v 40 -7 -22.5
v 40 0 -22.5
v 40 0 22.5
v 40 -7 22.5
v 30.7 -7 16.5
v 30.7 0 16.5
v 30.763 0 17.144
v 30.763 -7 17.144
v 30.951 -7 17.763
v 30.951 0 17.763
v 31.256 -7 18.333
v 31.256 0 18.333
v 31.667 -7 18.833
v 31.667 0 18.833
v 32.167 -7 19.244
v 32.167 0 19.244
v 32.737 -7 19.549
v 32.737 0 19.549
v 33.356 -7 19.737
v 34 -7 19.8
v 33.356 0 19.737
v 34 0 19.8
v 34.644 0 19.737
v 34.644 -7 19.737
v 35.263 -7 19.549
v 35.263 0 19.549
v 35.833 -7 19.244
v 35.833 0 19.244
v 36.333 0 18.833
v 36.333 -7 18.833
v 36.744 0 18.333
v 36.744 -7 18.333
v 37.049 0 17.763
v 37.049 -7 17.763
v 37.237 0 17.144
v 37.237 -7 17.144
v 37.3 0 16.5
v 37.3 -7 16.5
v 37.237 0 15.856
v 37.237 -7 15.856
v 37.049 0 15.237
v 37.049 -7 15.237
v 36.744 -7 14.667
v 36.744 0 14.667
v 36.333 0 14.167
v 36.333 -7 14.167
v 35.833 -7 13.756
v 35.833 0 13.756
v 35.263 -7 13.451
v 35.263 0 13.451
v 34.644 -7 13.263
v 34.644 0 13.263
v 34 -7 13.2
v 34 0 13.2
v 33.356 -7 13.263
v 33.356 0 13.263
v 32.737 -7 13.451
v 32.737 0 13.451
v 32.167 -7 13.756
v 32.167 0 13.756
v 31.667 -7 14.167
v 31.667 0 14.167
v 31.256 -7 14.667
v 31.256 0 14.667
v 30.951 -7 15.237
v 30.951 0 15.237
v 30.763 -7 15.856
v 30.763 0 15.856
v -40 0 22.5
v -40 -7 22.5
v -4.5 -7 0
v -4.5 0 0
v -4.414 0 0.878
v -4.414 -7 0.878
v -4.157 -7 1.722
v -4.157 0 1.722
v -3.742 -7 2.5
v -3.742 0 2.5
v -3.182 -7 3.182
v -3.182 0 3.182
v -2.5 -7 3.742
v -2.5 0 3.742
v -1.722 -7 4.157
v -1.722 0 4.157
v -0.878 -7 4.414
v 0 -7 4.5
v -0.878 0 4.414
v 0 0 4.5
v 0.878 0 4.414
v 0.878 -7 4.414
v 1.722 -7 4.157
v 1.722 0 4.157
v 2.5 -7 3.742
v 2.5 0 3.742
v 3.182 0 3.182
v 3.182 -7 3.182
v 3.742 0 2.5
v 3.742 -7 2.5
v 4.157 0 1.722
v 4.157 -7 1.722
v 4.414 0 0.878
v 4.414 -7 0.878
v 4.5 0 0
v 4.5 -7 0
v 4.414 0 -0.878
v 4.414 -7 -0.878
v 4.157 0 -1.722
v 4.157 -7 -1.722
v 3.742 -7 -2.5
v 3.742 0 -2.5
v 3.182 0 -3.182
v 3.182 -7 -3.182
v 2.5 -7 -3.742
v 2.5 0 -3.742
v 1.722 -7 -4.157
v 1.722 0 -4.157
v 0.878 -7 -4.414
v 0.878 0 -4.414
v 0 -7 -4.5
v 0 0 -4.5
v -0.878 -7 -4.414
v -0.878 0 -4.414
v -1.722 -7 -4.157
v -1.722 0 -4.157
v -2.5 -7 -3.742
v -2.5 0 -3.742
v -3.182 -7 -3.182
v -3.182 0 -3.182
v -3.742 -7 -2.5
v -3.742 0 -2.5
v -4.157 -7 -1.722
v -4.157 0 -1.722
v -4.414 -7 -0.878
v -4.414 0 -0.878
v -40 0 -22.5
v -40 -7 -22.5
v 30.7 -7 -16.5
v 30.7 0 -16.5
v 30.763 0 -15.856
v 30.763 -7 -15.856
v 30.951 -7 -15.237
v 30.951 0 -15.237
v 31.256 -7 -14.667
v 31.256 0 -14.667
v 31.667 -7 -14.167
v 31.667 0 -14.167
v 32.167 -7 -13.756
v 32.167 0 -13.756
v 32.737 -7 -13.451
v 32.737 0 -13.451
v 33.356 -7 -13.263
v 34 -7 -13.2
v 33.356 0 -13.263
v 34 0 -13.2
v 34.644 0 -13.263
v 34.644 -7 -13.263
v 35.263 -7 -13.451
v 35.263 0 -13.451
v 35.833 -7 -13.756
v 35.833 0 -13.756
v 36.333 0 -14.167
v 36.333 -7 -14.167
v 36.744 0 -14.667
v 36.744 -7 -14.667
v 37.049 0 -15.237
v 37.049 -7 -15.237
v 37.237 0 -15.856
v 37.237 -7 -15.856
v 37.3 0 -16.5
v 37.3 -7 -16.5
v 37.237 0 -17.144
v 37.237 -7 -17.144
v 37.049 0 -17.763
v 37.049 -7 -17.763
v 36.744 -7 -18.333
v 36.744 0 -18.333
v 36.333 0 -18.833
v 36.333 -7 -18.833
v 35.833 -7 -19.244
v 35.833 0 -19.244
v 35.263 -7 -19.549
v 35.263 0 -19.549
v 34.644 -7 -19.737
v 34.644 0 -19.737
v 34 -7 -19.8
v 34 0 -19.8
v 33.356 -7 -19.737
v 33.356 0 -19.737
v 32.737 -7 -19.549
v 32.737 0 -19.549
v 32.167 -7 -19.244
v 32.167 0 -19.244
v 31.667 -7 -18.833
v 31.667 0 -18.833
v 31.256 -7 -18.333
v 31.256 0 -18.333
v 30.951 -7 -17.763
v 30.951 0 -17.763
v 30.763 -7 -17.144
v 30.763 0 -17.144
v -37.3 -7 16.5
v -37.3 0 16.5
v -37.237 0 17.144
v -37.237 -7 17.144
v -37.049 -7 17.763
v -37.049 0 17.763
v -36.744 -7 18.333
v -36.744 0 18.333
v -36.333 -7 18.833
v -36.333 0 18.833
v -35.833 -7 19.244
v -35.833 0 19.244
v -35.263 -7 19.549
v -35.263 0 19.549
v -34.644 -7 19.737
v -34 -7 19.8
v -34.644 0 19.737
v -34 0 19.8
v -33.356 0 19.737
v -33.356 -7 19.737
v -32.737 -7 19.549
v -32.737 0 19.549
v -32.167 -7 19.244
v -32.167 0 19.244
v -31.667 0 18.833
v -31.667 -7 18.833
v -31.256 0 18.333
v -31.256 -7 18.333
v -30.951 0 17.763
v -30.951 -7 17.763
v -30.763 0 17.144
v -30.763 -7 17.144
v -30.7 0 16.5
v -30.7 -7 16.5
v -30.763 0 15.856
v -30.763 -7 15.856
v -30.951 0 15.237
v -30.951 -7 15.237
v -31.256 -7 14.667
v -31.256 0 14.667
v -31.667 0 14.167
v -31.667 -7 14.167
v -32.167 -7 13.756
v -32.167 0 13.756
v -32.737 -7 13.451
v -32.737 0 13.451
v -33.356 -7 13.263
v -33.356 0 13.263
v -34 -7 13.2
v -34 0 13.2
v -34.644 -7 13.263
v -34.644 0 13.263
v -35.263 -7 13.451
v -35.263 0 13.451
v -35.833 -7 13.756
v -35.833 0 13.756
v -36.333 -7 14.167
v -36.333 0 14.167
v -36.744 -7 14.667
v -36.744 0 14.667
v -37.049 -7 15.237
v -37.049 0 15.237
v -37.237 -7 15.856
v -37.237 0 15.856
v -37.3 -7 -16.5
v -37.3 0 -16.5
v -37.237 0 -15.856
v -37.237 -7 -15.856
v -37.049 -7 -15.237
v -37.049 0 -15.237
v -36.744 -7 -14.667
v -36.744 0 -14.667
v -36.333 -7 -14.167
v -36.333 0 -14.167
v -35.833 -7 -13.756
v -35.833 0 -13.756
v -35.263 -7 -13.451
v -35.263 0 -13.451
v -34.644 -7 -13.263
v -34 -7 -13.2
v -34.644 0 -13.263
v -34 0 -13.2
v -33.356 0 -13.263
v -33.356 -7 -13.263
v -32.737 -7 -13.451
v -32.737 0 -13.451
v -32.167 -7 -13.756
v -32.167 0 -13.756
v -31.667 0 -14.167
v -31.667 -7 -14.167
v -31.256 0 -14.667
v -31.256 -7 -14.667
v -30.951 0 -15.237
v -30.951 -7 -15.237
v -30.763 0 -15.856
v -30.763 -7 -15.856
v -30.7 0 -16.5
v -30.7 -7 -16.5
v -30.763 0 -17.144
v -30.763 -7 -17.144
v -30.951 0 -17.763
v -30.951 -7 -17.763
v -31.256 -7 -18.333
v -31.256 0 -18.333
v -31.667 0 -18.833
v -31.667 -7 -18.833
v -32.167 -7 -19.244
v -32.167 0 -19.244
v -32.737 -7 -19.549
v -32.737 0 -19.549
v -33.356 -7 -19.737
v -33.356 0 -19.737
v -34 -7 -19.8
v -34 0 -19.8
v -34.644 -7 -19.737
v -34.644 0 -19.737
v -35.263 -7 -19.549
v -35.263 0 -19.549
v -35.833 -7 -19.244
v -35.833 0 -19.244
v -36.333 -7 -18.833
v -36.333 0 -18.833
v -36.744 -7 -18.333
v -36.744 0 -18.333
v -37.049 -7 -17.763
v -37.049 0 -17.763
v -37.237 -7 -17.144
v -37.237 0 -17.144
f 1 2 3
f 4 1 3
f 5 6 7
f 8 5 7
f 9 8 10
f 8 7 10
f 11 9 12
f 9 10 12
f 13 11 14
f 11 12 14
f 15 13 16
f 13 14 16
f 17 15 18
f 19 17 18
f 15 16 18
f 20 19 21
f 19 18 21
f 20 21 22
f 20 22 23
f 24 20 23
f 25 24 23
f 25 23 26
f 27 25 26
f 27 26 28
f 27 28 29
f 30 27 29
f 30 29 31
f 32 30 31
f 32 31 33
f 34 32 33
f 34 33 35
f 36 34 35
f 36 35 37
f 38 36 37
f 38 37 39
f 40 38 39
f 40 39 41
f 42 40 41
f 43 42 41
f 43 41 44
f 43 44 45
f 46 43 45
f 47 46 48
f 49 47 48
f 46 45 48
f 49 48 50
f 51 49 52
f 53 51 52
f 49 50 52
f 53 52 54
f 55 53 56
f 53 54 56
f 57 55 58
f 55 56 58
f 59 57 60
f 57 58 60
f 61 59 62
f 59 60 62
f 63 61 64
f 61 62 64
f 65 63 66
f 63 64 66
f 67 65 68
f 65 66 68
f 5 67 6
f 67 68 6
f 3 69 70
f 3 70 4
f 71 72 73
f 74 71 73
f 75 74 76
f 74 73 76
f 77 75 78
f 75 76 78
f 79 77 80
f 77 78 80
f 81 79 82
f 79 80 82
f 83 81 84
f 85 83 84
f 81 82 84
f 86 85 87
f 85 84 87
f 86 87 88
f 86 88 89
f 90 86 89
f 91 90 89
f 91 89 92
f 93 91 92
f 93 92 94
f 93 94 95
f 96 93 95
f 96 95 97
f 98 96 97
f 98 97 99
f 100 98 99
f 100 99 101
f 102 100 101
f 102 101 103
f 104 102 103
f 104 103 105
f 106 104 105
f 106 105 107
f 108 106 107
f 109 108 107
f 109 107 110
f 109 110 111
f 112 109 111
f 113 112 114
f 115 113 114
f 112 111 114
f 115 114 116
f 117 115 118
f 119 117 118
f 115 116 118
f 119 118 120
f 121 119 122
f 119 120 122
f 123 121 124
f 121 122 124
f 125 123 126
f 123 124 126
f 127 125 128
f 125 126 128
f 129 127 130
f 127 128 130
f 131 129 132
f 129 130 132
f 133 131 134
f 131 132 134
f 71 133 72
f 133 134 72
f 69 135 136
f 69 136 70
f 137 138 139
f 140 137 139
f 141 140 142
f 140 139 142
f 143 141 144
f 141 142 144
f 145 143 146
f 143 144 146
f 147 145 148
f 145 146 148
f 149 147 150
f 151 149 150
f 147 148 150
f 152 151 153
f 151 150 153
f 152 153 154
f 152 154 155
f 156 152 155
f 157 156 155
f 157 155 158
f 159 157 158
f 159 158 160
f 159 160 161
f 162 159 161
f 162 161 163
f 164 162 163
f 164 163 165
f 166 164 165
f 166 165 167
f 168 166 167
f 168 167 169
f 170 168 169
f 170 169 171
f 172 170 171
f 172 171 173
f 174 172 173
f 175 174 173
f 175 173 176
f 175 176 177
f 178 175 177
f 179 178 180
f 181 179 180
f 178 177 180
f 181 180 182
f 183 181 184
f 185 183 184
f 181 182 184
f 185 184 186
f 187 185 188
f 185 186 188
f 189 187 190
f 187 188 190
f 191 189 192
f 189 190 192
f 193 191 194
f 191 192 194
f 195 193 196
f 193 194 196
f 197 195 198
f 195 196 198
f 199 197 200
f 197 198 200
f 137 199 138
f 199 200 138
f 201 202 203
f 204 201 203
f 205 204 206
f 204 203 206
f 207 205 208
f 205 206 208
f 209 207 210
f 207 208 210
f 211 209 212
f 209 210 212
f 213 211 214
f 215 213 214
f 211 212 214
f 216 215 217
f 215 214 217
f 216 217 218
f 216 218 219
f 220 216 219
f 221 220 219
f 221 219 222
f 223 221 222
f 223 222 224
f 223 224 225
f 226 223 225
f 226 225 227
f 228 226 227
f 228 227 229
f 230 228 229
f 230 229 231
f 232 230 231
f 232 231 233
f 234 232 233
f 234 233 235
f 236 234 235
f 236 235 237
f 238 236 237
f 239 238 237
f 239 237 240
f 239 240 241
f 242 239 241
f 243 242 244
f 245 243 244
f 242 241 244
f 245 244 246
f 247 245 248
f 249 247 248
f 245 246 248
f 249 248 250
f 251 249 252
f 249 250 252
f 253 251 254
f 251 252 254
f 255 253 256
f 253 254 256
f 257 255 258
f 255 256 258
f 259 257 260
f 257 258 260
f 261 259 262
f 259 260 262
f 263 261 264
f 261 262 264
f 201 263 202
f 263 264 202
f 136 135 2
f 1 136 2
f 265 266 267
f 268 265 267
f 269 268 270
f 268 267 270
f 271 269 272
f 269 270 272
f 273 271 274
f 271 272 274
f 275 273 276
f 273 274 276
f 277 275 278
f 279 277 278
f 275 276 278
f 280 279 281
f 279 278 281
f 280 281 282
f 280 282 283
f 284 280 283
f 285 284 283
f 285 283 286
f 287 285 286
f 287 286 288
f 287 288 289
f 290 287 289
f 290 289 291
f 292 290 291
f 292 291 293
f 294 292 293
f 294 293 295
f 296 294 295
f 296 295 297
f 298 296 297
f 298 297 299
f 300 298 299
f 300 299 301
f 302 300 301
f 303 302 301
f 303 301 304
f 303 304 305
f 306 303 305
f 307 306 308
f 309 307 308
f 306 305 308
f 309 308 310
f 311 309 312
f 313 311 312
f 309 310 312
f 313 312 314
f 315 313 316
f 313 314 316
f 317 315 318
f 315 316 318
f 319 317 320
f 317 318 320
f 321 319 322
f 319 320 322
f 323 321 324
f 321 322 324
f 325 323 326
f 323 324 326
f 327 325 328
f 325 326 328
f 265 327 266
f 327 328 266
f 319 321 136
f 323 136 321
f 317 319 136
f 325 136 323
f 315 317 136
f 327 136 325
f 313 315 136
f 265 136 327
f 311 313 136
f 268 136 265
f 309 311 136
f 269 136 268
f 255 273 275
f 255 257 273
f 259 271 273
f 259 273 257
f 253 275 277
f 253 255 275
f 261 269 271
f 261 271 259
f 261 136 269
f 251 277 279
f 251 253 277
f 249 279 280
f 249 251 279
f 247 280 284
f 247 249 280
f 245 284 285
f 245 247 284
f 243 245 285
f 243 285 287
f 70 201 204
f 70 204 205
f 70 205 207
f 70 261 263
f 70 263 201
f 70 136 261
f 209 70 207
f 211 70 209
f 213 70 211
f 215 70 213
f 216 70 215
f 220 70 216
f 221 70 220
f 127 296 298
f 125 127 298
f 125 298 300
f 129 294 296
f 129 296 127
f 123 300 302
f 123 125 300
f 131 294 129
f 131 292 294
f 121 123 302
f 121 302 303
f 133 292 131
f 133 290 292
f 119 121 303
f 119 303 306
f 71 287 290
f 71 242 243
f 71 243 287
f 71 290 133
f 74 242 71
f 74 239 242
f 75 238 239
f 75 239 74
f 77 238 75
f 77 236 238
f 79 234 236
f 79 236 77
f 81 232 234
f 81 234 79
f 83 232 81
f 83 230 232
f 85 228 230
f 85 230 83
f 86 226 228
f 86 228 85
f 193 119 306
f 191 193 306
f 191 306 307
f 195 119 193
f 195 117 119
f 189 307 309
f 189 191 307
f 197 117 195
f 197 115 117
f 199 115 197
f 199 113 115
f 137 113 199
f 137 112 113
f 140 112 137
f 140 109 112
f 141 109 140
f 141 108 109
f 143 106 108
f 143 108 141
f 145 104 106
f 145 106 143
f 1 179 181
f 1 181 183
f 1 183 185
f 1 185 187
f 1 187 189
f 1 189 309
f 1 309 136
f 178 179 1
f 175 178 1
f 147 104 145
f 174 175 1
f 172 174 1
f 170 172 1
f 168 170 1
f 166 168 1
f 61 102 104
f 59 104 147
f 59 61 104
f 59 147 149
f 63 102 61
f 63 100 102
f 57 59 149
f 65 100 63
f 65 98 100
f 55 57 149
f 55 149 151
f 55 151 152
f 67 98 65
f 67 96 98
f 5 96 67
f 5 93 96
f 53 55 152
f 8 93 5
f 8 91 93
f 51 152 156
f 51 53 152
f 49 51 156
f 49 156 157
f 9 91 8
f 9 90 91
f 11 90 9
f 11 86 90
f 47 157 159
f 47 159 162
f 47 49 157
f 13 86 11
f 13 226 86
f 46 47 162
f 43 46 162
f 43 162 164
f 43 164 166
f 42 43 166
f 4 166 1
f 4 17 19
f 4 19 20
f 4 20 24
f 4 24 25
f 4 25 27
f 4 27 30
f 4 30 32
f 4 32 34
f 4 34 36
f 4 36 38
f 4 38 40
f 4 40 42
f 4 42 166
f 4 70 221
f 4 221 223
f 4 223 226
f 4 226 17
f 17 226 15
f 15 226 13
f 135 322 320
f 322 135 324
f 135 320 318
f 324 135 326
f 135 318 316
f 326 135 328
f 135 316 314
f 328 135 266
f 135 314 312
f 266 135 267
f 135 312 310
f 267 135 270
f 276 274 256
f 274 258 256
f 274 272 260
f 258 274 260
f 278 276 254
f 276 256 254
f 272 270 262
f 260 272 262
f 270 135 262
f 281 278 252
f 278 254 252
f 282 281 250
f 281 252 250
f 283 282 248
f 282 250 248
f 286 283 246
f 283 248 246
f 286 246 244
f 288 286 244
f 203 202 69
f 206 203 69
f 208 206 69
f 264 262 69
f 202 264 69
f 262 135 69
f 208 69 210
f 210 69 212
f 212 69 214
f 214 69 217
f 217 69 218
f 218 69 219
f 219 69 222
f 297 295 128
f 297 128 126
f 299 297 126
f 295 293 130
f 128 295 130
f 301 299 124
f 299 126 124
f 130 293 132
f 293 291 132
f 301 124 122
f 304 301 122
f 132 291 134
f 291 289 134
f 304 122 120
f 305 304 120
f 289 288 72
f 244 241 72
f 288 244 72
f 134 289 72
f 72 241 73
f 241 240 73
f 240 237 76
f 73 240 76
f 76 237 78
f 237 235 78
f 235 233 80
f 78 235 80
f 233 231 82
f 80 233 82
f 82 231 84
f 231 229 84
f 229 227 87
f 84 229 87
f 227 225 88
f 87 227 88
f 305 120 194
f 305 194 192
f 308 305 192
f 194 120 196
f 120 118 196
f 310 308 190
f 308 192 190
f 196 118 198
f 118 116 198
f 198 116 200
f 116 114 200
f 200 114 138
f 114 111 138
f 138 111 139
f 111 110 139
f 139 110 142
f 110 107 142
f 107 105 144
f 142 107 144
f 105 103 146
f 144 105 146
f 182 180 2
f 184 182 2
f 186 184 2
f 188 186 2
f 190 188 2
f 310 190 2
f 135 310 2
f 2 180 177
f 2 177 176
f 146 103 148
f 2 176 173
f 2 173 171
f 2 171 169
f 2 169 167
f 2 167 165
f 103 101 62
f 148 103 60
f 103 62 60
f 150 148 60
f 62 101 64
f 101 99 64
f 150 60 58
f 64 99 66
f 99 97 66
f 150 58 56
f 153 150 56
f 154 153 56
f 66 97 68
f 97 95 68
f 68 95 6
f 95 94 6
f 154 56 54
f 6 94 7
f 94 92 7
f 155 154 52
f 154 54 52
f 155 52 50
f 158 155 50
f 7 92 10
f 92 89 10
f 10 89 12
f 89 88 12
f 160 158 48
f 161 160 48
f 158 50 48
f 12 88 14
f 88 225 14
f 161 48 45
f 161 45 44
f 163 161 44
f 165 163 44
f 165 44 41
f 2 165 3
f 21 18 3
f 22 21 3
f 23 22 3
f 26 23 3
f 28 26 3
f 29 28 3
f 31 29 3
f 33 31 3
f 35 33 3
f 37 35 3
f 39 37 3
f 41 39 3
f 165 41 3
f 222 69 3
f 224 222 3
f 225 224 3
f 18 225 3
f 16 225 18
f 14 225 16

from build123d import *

# Parameters (mm, degrees)
F0_W     = 80
F0_H     = 45
F1_DEPTH = 7
F3_D     = 6.6
F5_D     = 9


with BuildPart() as f1:
    # F0 (on Front) → F1 (new body)
    with BuildSketch(Plane.XZ):
        Rectangle(F0_W, F0_H)
    extrude(amount=F1_DEPTH)

    # F3 (through all)
    with Locations(Plane.XZ.offset(7)):
        with Locations((-34, 16.5), (-34, -16.5), (34, -16.5), (34, 16.5)):
            Hole(F3_D / 2)

    # F5 (through all)
    with Locations(Plane.XZ.offset(7)):
        with Locations((0, 0)):
            Hole(F5_D / 2)


solid = f1.part
